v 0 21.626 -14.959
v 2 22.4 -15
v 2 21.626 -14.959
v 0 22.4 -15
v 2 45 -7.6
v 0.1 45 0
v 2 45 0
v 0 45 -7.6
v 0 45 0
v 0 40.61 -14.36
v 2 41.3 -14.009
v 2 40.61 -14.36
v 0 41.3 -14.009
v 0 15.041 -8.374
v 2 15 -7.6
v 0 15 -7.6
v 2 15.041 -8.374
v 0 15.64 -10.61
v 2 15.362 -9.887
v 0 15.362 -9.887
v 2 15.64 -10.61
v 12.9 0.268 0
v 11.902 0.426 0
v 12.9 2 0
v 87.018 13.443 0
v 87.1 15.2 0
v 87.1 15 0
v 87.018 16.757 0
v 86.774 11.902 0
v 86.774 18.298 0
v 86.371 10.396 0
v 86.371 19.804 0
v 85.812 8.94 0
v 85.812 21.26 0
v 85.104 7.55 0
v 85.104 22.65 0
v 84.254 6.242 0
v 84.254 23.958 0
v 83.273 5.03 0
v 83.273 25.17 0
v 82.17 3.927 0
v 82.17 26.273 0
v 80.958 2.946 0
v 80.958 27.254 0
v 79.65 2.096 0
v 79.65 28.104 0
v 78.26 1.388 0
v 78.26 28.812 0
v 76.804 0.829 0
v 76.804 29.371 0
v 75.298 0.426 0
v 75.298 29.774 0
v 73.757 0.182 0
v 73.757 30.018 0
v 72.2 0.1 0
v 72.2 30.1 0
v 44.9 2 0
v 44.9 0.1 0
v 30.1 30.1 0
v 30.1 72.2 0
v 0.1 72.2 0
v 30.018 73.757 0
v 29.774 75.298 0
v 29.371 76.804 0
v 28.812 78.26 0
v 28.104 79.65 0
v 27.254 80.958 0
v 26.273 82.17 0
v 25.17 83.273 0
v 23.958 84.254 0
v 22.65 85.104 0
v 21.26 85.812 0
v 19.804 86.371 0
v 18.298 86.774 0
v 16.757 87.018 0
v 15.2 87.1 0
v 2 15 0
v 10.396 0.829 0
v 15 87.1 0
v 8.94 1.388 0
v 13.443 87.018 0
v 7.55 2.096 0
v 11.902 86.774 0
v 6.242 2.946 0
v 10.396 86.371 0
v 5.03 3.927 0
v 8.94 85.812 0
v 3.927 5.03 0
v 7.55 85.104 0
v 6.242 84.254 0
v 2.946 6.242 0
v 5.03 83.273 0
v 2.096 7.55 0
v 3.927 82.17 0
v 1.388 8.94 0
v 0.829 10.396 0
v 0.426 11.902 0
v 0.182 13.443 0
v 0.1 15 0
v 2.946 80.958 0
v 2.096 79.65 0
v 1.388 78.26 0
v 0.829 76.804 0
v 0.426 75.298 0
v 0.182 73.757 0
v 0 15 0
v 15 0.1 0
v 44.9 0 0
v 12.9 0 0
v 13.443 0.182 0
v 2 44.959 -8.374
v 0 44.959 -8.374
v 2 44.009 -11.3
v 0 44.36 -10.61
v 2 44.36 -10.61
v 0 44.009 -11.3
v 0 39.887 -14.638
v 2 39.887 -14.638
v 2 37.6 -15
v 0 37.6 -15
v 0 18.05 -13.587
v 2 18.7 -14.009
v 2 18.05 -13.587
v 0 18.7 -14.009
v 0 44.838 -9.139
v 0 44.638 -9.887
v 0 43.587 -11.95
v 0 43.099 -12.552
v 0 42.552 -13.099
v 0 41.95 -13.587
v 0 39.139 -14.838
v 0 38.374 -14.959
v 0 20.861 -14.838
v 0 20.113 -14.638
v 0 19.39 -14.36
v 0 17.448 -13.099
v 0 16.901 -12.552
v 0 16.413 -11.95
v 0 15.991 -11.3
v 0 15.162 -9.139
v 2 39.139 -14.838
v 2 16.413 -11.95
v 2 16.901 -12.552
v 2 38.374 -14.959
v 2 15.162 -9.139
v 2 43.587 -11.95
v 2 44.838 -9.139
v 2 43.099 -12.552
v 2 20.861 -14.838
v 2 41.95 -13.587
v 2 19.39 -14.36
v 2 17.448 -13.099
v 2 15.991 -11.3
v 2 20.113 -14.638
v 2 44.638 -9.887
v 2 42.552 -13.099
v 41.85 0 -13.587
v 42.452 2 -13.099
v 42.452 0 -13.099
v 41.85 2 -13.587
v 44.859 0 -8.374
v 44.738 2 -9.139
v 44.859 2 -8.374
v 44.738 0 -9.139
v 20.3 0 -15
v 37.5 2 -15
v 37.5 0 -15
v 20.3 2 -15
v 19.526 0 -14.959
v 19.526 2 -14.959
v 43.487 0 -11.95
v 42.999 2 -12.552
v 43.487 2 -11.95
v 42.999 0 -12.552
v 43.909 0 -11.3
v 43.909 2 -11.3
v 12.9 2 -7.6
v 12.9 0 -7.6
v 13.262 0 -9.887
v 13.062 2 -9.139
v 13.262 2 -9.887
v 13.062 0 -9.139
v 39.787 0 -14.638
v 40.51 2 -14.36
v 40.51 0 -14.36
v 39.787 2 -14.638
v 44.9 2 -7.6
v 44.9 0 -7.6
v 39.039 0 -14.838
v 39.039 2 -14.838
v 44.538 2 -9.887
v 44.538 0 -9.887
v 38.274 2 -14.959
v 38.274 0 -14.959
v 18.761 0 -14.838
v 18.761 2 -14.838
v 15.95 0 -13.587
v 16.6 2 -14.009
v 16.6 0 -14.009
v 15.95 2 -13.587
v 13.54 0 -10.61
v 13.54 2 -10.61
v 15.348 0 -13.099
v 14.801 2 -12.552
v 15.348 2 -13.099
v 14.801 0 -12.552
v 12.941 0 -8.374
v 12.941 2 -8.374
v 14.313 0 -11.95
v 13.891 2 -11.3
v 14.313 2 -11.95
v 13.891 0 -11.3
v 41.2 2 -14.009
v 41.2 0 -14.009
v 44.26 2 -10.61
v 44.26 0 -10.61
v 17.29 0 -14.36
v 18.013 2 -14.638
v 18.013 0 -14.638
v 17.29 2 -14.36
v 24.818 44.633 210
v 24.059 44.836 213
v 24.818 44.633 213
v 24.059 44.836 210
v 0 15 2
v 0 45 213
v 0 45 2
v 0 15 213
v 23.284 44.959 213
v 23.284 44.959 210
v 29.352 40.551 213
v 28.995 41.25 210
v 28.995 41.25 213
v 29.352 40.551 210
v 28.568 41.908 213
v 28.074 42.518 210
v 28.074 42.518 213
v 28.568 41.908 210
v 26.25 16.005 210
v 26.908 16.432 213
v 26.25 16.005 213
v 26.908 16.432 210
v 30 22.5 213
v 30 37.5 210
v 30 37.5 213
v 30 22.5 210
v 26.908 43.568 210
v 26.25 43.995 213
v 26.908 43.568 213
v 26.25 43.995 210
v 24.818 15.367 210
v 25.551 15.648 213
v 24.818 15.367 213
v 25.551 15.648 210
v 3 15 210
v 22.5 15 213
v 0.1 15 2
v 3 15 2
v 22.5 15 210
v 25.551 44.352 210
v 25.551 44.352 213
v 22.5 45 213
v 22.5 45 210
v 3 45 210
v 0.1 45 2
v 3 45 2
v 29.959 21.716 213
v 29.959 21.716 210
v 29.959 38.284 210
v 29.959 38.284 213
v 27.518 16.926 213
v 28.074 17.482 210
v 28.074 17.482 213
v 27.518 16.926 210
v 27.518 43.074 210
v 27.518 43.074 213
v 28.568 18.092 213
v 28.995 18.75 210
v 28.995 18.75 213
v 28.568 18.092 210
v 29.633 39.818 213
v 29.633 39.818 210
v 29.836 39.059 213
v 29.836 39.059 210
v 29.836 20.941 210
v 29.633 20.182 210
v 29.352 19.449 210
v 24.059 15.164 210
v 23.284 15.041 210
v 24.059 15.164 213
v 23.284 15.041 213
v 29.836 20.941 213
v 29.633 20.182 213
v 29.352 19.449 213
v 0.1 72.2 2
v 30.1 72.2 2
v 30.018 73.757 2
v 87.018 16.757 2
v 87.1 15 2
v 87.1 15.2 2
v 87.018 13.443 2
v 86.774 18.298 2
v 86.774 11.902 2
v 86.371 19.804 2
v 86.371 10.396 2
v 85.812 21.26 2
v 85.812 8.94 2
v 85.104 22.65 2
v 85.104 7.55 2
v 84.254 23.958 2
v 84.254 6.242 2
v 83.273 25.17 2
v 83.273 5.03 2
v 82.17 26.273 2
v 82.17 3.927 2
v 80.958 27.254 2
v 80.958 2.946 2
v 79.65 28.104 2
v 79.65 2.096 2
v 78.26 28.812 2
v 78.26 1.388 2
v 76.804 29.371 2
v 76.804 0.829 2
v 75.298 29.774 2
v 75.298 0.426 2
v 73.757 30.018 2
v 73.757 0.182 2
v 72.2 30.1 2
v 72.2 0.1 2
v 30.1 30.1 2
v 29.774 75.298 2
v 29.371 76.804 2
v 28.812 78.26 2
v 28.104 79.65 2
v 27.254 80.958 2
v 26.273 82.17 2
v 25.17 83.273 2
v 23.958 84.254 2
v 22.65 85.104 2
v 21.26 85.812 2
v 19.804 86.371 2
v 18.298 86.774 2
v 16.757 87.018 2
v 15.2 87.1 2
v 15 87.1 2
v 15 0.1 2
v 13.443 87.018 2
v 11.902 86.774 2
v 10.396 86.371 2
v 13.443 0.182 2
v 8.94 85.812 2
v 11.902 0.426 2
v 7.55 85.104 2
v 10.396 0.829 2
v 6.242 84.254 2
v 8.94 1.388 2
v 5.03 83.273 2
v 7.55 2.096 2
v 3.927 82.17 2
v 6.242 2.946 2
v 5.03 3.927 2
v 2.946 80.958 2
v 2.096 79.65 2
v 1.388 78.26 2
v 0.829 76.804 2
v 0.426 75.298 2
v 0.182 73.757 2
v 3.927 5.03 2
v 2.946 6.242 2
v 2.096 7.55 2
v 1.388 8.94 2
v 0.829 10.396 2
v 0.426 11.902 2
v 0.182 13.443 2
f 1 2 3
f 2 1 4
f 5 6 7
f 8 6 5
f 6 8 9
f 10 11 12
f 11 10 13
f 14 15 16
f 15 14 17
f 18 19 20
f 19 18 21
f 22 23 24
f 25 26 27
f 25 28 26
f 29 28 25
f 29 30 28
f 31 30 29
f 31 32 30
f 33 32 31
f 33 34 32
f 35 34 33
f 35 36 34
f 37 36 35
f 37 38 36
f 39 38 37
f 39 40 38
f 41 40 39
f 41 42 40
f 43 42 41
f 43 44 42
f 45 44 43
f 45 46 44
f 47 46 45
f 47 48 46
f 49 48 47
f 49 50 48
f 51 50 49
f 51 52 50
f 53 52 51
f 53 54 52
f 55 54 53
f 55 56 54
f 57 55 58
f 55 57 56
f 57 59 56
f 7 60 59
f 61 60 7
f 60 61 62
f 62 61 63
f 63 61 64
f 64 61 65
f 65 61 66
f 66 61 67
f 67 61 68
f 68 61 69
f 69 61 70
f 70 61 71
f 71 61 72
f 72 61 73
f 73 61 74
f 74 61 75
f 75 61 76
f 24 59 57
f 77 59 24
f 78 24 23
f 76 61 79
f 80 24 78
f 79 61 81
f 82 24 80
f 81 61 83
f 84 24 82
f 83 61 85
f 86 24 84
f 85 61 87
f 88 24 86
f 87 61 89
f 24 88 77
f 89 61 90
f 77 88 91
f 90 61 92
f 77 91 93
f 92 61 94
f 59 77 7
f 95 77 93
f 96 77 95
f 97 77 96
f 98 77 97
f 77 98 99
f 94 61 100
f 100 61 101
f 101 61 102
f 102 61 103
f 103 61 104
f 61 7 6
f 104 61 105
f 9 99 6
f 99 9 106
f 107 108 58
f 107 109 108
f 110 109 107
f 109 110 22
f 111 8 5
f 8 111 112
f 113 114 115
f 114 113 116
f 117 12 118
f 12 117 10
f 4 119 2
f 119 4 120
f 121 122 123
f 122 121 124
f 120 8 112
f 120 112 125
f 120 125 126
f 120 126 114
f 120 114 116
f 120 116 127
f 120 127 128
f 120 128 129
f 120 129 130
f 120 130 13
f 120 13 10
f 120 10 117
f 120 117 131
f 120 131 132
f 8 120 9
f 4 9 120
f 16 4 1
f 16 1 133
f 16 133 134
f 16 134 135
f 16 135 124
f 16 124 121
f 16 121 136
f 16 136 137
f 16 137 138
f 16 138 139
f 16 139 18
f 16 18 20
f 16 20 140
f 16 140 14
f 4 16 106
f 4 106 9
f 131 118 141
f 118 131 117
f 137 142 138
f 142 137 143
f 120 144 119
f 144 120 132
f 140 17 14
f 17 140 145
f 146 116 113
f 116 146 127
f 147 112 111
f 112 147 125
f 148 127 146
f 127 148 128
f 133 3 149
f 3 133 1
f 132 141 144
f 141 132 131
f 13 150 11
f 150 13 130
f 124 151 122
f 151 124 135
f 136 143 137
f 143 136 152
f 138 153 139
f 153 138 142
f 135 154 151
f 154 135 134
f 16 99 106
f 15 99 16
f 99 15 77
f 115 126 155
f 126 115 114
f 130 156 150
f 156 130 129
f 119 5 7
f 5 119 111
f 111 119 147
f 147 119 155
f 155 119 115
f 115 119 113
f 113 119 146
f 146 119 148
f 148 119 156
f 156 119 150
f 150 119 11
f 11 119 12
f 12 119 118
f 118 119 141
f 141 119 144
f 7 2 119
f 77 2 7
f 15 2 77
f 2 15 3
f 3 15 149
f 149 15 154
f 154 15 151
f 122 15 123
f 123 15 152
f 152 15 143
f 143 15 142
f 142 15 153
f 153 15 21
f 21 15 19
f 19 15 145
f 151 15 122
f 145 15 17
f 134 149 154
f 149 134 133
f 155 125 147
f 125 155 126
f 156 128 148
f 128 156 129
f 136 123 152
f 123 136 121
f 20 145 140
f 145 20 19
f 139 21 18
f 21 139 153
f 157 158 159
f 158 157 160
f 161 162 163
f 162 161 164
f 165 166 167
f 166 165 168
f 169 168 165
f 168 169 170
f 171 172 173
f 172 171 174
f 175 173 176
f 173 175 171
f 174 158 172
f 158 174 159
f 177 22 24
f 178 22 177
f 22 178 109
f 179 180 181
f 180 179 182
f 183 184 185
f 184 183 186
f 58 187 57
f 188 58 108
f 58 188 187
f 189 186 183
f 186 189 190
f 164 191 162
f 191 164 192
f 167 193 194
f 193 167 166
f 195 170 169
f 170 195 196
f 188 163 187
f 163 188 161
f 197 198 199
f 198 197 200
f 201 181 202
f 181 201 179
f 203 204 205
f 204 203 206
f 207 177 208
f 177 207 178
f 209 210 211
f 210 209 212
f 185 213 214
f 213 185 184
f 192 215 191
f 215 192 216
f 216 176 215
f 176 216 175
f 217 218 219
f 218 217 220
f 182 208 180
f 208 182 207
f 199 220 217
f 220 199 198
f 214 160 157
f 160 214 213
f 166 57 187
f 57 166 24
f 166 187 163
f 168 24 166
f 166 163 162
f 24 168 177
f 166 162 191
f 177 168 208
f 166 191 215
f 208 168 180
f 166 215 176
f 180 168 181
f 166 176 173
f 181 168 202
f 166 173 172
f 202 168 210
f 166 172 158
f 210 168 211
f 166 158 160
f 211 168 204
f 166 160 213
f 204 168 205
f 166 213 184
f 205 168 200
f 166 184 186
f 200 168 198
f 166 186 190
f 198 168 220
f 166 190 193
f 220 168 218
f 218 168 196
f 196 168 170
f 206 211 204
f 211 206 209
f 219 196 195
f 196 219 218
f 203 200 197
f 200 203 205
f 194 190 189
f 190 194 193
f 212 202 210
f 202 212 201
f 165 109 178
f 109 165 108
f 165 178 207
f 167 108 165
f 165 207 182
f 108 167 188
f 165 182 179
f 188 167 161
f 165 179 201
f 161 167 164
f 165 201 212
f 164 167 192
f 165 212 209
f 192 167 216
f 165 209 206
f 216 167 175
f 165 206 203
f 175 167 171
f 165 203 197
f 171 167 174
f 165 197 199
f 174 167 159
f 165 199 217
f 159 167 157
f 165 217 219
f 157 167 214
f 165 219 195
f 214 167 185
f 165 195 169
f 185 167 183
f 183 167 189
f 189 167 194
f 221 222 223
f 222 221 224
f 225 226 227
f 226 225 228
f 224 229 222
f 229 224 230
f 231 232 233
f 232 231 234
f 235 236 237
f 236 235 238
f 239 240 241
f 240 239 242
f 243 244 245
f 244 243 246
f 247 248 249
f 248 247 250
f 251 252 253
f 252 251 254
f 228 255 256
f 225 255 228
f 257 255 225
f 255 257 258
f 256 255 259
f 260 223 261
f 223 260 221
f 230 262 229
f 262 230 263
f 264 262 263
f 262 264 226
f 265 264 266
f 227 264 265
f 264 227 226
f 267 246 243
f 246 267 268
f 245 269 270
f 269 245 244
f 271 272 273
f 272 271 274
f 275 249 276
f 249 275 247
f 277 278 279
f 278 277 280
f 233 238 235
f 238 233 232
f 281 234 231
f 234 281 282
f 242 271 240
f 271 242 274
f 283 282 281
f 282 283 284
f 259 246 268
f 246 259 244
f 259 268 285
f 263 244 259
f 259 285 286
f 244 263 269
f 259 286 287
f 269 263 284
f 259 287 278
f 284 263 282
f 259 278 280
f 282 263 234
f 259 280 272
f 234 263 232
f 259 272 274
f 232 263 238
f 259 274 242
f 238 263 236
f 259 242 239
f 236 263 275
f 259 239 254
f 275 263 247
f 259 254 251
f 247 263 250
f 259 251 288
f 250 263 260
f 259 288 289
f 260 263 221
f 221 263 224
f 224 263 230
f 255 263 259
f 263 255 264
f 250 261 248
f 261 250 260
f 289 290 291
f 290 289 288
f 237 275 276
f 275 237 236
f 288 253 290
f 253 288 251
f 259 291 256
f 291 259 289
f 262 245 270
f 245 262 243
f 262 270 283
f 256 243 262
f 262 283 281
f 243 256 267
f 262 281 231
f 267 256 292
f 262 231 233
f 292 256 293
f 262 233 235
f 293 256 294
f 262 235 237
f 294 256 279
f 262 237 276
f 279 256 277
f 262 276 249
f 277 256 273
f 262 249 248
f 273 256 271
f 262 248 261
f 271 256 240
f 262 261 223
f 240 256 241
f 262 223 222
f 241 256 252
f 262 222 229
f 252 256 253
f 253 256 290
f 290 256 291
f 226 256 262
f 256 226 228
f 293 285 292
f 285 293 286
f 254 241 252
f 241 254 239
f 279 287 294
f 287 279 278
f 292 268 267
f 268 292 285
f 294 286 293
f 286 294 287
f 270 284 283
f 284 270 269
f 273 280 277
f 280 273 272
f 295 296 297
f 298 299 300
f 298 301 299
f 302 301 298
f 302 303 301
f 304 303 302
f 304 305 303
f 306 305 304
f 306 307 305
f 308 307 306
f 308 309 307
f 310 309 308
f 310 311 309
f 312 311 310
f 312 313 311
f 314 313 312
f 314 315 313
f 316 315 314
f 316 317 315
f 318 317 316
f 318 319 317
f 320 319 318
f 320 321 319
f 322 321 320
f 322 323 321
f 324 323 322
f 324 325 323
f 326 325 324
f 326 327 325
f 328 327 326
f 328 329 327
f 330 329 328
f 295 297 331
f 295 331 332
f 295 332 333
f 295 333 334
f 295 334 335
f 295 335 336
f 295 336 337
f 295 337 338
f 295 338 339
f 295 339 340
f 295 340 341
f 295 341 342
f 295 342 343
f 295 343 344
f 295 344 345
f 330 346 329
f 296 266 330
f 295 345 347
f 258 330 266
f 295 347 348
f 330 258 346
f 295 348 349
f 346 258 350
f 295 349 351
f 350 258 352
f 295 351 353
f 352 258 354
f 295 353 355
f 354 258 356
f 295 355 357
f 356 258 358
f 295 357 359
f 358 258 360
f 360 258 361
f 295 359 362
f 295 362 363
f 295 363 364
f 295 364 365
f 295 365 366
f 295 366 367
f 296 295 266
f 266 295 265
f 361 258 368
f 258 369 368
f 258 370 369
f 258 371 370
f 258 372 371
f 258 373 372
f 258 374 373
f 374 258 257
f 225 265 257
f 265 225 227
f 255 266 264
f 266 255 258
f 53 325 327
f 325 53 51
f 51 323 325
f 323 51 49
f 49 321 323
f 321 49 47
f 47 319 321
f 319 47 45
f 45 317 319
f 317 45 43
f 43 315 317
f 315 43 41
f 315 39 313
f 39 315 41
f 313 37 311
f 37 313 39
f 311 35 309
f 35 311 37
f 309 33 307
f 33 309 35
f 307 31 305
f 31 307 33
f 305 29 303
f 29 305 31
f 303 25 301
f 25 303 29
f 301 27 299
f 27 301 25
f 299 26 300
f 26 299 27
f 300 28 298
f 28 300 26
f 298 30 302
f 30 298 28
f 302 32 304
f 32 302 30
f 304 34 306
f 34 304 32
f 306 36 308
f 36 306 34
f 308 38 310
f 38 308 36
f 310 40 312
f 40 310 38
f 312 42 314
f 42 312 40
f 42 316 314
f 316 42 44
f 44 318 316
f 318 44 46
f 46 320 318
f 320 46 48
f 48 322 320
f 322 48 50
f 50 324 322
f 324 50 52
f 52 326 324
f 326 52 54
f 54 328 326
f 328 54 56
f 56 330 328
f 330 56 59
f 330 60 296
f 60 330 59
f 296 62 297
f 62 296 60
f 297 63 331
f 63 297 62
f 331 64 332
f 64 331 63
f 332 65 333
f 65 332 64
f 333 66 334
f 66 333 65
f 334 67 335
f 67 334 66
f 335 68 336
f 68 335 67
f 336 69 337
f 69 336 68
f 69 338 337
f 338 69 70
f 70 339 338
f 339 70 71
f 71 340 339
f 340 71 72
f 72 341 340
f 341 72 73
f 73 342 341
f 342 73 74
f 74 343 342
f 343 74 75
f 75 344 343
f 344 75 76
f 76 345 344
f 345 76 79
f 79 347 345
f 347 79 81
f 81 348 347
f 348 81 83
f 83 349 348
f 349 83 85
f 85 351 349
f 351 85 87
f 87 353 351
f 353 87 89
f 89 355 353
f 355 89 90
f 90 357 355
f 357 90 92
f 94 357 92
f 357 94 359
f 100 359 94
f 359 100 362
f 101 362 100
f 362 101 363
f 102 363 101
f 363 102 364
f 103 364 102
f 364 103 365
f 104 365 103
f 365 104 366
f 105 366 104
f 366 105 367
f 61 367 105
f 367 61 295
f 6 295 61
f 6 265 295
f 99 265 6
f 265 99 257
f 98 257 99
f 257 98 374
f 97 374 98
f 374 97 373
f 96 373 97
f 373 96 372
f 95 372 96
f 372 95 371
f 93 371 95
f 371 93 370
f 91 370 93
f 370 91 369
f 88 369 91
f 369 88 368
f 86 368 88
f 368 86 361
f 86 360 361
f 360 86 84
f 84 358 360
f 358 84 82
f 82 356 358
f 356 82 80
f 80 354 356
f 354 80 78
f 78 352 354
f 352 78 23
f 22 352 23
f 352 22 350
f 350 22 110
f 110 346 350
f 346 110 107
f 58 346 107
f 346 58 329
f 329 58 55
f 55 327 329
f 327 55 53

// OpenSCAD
// =============================================
// 3D: Ceiling Corner Support for Printer Frame
// Version: 1.1
// Author: ChatGPT (OpenSCAD)
// =============================================

// ----------------------------
// Описание модулей (фрагментов)
// ----------------------------
// base() — полная сборка: объединяет bottom_pad(len), corner_fillet_xy(...), post(h),
//          top_pad(), wrap_tabs(); len/h берутся из arm_len_full/post_h_full
//          или arm_len_tf/post_h_tf при test_fragment=true.
// top_pad() — верхняя площадка: pad_xy × pad_y, толщина top_pad_th; расположена на
//             Z = base_th + post_h_*; скругления контролируются radius_r.
// post(h) — вертикальная стойка сечением post_th × frame_w, высота h; основание на Z=base_th;
//           скругление рёбер ограничено min(radius_r, post_th/2).
// bottom_pad(len) — нижняя L‑образная площадка: две полосы шириной frame_w и длиной len,
//                   толщина base_th, внутренний угол со скруглением radius_r; уходит в +X и +Y.
// left_wrap() / right_wrap() — вертикальные «обжимные» лапки: ширина wrap_w, высота вниз wrap_h,
//                              толщина wrap_th; охватывают раму снаружи вдоль сторон Y и X.
// wrap_tabs() — объединяет обе лапки (left_wrap и right_wrap).
// (упрощено) Рёбра жёсткости и дополнительные косынки удалены из модели
// clip_for_fragments() — при test_fragment=true выводит два укороченных фрагмента; окна клипа
//                        задаются frag_size, frag_gap_x, frag_h_extra.

// ----------------------------
// Настройка точности
// ----------------------------
$fn = 0;        // фиксированную сегментацию отключаем
$fa = 6;        // 5–8° обычно достаточно
$fs = 0.35;     // ≈ диаметр сопла (0.3–0.5 для сопла 0.4)
pin_fs = 0.25;  // чуть тоньше для штырей и отверстий


// ----------------------------
// Тестовые фрагменты (стандартный блок)
// ----------------------------
test_fragment = false; // true — печатать только укороченные фрагменты
frag_size     = 50;    // размер квадрата вырезки, мм (для обрезки intersection)
frag_gap_x    = 10;    // зазор между фрагментами по X, мм
frag_h_extra  = 50;    // запас по высоте клипа, мм

// ----------------------------
// Фаски/скругления по краям
// ----------------------------
tiny = 0.1;                  // небольшой зазор для булевых операций

// Скругления
radius_r = 30;                 // общий радиус скруглений по 2D-контуром (мм)

// ----------------------------
// Параметры модели (все размеры в мм)
// ----------------------------
// Габариты рамы и подпорки
frame_w         = 30;        // ширина рамы принтера (и ширина подпорки)
post_th         = 3;         // толщина вертикальной стойки (подпорки)
post_y = radius_r/2;
base_th         = 2;         // толщина нижних горизонтальных лапок (площадка сверху рамы)
top_pad_th      = 3;         // толщина верхней квадратной площадки

// Высота
gap_total       = 213;       // расстояние от верха рамы до потолка
post_h_full     = gap_total - (base_th + top_pad_th); //= 208

// Горизонтальные лапки (на раму)
arm_len_full    = 87;        // длина лапок от угла рамы (по X и по Y)
// bottom_pad_r удалён — используем общий radius_r

// Вертикальные лапки (обхват снаружи)
wrap_h          = 15;        // высота вниз по Z (от 0 до -wrap_h)
wrap_w          = frame_w;   // ширина вдоль ребра (по X или Y)
wrap_th         = 2;         // толщина каждой вертикальной лапки (наружу, по X/Y)

// Верхняя площадка
pad_xy          = 30;        // 30x30 мм квадратная площадка сверху
pad_y           = 2*post_y;  // ширина по Y верхней площадки (в 2 раза больше post_y)

// (упрощено) блок параметров рёбер жёсткости удалён

// ----------------------------
// Значения для test_fragment
// ----------------------------
arm_len_tf      = 40;        // укороченная длина лапок
height_tf_total = 50;        // общая высота фрагмента
post_h_tf       = height_tf_total - (base_th + top_pad_th); // укороченная высота стойки

// ----------------------------
// Вспомогательные функции/модули
// ----------------------------
// 2D-скруглённый прямоугольник заданного размера (внешний габарит size=[x,y])
module rr2d(size=[10,10], r=2){
    sx = size[0]; sy = size[1];
    // стартовая внутренняя заготовка меньше на 2*r, затем offset(r)
    offset(r=r)
        square([max(sx-2*r, tiny), max(sy-2*r, tiny)], center=false);
}

// 2D-прямоугольник с закруглением ТОЛЬКО на стороне minY (низу)
module rr2d_round_minY(size=[10,10], r=2){
    w = size[0]; h = size[1];
    r2 = min(r, w/2 - tiny, h/2 - tiny);
    union(){
        // Верхняя часть без скруглений
        translate([0, r2]) square([w, max(h - r2, tiny)], center=false);
        // Нижняя перемычка между кругами
        translate([r2, 0]) square([max(w - 2*r2, tiny), r2], center=false);
        // Кварткруги снизу слева и справа
        translate([r2, r2]) circle(r=r2);
        translate([w - r2, r2]) circle(r=r2);
    }
}

// 2D-прямоугольник с закруглением ТОЛЬКО на стороне minX (слева)
module rr2d_round_minX(size=[10,10], r=2){
    // Скругление только на стороне ПРАВАЯ (maxX); minX остаётся прямой
    w = size[0]; h = size[1];
    r2 = min(r, w/2 - tiny, h/2 - tiny);
    union(){
        // Основной прямоугольник по всей ширине без скругления слева
        square([w - r2, h], center=false);
        // Правые верх/низ закругляем четвертями круга у точки (w - r2, ...)
        translate([w - r2, r2]) circle(r=r2, $fs=pin_fs, $fa=6);
        translate([w - r2, h - r2]) circle(r=r2, $fs=pin_fs, $fa=6);
        // Вертикальная перемычка между четвертями
        translate([w - r2, r2]) square([r2, max(h - 2*r2, tiny)], center=false);
    }
}

// 2D-скруглённая L-форма: две полосы шириной w и длиной len, сходящиеся в углу (0,0)
module L2D(len, w, r){
    // Скругляем внешние углы без увеличения общей толщины w.
    r_eff = min(r, w/2 - tiny, len/2 - tiny);
    inner_len = max(len - 2*r_eff, tiny);
    inner_w   = max(w   - 2*r_eff, tiny);
    // Основная L-форма со скруглёнными внешними кромками
    offset(r=r_eff)
        union(){
            square([inner_len, inner_w], center=false);   // полоса по X (внутренняя)
            square([inner_w, inner_len], center=false);   // полоса по Y (внутренняя)
        }
}

// Верхняя квадратная площадка (с полукругом справа и скруглением левого края)
module top_pad(){
    translate([0, post_y, base_th + (test_fragment?post_h_tf:post_h_full)])
        linear_extrude(height=top_pad_th)
            rr2d_round_minX([pad_xy, pad_y], r=radius_r/4);
}

// Вертикальная стойка (30 x 3, высота post_h)
module post(h){
    // Прямоугольная стойка без скруглений, прижатая к внутреннему углу (minX=0, minY=0)
    translate([0, post_y, base_th])
        linear_extrude(height=h)
            square([post_th, frame_w], center=false);
}

// Нижние горизонтальные лапки-"Г" (толщина base_th)
module bottom_pad(len){
    translate([radius_r/2, post_y, 0])
        linear_extrude(height=base_th)
            L2D(len, frame_w, radius_r);
}

// Левая лапка (обхват по Y-стороне)
module left_wrap(){
    r_corner = min(radius_r, frame_w/2 - tiny);
    // wrap_w = max(wrap_w + wrap_th, tiny); // уменьшить охват по Y на wrap_th
    translate([wrap_th, post_y + wrap_w, -wrap_h])
        rotate([270,180,90])
            linear_extrude(height=wrap_th)
                rr2d_round_minY([wrap_w, wrap_h], r=min(radius_r, wrap_w/2 - tiny, wrap_h/2 - tiny));
}

// Правая лапка (обхват по X-стороне)
module right_wrap(){
    r_corner = min(radius_r, frame_w/2 - tiny);
    translate([frame_w + r_corner, 0, 0])
        rotate([0,90,90])
            linear_extrude(height=wrap_th)
                rr2d_round_minX([wrap_h, wrap_w + wrap_th], r=min(radius_r, (wrap_w + wrap_th)/2 - tiny, wrap_h/2 - tiny));
}

// Совместимость: собрать обе лапки
module wrap_tabs(){
    left_wrap();
    right_wrap();
}

// Опциональные рёбра жёсткости (две косынки вдоль X и Y)
// (упрощено) add_supports удалён — не используется

// Полная сборка модели
module base(){
    len = test_fragment ? arm_len_tf : arm_len_full;
    h   = test_fragment ? post_h_tf   : post_h_full;

    union(){
        top_pad();
        post(h);
        bottom_pad(len);
        wrap_tabs();
        // (упрощено) дополнительные скругления и рёбра убраны
    }
}

// ---------------
// Клиппер фрагментов
// ---------------
module clip_for_fragments(){
    if(test_fragment){
        // Фрагмент у основания
        translate([0,0,0])
            intersection(){
                children();
                translate([0,0,-frag_h_extra])
                    cube([frag_size, frag_size, base_th + post_h_tf + top_pad_th + 2*frag_h_extra], center=false);
            }
        // Фрагмент у вершины (сдвинем по X для разнесения)
        translate([frag_size + frag_gap_x, 0, 0])
            intersection(){
                children();
                // окно вокруг верхней площадки
                z0 = base_th + max(post_h_tf - frag_size/2, 0);
                translate([0,0,z0])
                    cube([frag_size, frag_size, frag_size + frag_h_extra], center=false);
            }
    }else{
        children();
    }
}

// ----------------------------
// ВЫВОД МОДЕЛИ
// ----------------------------
clip_for_fragments() base();

// ----------------------------
// Примечания по ориентации:
// - Система координат выбрана так, что угол рамы находится в (0,0,0).
// - Лапки и площадки уходят в +X и +Y от угла. Левый наружный край — плоскость X=0.
// - Топ-площадка 30x30 мм расположена строго над стойкой.
// - Вертикальные лапки вниз (wrap_tabs) находятся только с внешней стороны угла: у Y=frame_w и X=frame_w.
// - Радиусы скругления по 2D-контуром = radius_r. Для стойки радиус ограничен её толщиной (минимум из radius_r и post_th/2).
